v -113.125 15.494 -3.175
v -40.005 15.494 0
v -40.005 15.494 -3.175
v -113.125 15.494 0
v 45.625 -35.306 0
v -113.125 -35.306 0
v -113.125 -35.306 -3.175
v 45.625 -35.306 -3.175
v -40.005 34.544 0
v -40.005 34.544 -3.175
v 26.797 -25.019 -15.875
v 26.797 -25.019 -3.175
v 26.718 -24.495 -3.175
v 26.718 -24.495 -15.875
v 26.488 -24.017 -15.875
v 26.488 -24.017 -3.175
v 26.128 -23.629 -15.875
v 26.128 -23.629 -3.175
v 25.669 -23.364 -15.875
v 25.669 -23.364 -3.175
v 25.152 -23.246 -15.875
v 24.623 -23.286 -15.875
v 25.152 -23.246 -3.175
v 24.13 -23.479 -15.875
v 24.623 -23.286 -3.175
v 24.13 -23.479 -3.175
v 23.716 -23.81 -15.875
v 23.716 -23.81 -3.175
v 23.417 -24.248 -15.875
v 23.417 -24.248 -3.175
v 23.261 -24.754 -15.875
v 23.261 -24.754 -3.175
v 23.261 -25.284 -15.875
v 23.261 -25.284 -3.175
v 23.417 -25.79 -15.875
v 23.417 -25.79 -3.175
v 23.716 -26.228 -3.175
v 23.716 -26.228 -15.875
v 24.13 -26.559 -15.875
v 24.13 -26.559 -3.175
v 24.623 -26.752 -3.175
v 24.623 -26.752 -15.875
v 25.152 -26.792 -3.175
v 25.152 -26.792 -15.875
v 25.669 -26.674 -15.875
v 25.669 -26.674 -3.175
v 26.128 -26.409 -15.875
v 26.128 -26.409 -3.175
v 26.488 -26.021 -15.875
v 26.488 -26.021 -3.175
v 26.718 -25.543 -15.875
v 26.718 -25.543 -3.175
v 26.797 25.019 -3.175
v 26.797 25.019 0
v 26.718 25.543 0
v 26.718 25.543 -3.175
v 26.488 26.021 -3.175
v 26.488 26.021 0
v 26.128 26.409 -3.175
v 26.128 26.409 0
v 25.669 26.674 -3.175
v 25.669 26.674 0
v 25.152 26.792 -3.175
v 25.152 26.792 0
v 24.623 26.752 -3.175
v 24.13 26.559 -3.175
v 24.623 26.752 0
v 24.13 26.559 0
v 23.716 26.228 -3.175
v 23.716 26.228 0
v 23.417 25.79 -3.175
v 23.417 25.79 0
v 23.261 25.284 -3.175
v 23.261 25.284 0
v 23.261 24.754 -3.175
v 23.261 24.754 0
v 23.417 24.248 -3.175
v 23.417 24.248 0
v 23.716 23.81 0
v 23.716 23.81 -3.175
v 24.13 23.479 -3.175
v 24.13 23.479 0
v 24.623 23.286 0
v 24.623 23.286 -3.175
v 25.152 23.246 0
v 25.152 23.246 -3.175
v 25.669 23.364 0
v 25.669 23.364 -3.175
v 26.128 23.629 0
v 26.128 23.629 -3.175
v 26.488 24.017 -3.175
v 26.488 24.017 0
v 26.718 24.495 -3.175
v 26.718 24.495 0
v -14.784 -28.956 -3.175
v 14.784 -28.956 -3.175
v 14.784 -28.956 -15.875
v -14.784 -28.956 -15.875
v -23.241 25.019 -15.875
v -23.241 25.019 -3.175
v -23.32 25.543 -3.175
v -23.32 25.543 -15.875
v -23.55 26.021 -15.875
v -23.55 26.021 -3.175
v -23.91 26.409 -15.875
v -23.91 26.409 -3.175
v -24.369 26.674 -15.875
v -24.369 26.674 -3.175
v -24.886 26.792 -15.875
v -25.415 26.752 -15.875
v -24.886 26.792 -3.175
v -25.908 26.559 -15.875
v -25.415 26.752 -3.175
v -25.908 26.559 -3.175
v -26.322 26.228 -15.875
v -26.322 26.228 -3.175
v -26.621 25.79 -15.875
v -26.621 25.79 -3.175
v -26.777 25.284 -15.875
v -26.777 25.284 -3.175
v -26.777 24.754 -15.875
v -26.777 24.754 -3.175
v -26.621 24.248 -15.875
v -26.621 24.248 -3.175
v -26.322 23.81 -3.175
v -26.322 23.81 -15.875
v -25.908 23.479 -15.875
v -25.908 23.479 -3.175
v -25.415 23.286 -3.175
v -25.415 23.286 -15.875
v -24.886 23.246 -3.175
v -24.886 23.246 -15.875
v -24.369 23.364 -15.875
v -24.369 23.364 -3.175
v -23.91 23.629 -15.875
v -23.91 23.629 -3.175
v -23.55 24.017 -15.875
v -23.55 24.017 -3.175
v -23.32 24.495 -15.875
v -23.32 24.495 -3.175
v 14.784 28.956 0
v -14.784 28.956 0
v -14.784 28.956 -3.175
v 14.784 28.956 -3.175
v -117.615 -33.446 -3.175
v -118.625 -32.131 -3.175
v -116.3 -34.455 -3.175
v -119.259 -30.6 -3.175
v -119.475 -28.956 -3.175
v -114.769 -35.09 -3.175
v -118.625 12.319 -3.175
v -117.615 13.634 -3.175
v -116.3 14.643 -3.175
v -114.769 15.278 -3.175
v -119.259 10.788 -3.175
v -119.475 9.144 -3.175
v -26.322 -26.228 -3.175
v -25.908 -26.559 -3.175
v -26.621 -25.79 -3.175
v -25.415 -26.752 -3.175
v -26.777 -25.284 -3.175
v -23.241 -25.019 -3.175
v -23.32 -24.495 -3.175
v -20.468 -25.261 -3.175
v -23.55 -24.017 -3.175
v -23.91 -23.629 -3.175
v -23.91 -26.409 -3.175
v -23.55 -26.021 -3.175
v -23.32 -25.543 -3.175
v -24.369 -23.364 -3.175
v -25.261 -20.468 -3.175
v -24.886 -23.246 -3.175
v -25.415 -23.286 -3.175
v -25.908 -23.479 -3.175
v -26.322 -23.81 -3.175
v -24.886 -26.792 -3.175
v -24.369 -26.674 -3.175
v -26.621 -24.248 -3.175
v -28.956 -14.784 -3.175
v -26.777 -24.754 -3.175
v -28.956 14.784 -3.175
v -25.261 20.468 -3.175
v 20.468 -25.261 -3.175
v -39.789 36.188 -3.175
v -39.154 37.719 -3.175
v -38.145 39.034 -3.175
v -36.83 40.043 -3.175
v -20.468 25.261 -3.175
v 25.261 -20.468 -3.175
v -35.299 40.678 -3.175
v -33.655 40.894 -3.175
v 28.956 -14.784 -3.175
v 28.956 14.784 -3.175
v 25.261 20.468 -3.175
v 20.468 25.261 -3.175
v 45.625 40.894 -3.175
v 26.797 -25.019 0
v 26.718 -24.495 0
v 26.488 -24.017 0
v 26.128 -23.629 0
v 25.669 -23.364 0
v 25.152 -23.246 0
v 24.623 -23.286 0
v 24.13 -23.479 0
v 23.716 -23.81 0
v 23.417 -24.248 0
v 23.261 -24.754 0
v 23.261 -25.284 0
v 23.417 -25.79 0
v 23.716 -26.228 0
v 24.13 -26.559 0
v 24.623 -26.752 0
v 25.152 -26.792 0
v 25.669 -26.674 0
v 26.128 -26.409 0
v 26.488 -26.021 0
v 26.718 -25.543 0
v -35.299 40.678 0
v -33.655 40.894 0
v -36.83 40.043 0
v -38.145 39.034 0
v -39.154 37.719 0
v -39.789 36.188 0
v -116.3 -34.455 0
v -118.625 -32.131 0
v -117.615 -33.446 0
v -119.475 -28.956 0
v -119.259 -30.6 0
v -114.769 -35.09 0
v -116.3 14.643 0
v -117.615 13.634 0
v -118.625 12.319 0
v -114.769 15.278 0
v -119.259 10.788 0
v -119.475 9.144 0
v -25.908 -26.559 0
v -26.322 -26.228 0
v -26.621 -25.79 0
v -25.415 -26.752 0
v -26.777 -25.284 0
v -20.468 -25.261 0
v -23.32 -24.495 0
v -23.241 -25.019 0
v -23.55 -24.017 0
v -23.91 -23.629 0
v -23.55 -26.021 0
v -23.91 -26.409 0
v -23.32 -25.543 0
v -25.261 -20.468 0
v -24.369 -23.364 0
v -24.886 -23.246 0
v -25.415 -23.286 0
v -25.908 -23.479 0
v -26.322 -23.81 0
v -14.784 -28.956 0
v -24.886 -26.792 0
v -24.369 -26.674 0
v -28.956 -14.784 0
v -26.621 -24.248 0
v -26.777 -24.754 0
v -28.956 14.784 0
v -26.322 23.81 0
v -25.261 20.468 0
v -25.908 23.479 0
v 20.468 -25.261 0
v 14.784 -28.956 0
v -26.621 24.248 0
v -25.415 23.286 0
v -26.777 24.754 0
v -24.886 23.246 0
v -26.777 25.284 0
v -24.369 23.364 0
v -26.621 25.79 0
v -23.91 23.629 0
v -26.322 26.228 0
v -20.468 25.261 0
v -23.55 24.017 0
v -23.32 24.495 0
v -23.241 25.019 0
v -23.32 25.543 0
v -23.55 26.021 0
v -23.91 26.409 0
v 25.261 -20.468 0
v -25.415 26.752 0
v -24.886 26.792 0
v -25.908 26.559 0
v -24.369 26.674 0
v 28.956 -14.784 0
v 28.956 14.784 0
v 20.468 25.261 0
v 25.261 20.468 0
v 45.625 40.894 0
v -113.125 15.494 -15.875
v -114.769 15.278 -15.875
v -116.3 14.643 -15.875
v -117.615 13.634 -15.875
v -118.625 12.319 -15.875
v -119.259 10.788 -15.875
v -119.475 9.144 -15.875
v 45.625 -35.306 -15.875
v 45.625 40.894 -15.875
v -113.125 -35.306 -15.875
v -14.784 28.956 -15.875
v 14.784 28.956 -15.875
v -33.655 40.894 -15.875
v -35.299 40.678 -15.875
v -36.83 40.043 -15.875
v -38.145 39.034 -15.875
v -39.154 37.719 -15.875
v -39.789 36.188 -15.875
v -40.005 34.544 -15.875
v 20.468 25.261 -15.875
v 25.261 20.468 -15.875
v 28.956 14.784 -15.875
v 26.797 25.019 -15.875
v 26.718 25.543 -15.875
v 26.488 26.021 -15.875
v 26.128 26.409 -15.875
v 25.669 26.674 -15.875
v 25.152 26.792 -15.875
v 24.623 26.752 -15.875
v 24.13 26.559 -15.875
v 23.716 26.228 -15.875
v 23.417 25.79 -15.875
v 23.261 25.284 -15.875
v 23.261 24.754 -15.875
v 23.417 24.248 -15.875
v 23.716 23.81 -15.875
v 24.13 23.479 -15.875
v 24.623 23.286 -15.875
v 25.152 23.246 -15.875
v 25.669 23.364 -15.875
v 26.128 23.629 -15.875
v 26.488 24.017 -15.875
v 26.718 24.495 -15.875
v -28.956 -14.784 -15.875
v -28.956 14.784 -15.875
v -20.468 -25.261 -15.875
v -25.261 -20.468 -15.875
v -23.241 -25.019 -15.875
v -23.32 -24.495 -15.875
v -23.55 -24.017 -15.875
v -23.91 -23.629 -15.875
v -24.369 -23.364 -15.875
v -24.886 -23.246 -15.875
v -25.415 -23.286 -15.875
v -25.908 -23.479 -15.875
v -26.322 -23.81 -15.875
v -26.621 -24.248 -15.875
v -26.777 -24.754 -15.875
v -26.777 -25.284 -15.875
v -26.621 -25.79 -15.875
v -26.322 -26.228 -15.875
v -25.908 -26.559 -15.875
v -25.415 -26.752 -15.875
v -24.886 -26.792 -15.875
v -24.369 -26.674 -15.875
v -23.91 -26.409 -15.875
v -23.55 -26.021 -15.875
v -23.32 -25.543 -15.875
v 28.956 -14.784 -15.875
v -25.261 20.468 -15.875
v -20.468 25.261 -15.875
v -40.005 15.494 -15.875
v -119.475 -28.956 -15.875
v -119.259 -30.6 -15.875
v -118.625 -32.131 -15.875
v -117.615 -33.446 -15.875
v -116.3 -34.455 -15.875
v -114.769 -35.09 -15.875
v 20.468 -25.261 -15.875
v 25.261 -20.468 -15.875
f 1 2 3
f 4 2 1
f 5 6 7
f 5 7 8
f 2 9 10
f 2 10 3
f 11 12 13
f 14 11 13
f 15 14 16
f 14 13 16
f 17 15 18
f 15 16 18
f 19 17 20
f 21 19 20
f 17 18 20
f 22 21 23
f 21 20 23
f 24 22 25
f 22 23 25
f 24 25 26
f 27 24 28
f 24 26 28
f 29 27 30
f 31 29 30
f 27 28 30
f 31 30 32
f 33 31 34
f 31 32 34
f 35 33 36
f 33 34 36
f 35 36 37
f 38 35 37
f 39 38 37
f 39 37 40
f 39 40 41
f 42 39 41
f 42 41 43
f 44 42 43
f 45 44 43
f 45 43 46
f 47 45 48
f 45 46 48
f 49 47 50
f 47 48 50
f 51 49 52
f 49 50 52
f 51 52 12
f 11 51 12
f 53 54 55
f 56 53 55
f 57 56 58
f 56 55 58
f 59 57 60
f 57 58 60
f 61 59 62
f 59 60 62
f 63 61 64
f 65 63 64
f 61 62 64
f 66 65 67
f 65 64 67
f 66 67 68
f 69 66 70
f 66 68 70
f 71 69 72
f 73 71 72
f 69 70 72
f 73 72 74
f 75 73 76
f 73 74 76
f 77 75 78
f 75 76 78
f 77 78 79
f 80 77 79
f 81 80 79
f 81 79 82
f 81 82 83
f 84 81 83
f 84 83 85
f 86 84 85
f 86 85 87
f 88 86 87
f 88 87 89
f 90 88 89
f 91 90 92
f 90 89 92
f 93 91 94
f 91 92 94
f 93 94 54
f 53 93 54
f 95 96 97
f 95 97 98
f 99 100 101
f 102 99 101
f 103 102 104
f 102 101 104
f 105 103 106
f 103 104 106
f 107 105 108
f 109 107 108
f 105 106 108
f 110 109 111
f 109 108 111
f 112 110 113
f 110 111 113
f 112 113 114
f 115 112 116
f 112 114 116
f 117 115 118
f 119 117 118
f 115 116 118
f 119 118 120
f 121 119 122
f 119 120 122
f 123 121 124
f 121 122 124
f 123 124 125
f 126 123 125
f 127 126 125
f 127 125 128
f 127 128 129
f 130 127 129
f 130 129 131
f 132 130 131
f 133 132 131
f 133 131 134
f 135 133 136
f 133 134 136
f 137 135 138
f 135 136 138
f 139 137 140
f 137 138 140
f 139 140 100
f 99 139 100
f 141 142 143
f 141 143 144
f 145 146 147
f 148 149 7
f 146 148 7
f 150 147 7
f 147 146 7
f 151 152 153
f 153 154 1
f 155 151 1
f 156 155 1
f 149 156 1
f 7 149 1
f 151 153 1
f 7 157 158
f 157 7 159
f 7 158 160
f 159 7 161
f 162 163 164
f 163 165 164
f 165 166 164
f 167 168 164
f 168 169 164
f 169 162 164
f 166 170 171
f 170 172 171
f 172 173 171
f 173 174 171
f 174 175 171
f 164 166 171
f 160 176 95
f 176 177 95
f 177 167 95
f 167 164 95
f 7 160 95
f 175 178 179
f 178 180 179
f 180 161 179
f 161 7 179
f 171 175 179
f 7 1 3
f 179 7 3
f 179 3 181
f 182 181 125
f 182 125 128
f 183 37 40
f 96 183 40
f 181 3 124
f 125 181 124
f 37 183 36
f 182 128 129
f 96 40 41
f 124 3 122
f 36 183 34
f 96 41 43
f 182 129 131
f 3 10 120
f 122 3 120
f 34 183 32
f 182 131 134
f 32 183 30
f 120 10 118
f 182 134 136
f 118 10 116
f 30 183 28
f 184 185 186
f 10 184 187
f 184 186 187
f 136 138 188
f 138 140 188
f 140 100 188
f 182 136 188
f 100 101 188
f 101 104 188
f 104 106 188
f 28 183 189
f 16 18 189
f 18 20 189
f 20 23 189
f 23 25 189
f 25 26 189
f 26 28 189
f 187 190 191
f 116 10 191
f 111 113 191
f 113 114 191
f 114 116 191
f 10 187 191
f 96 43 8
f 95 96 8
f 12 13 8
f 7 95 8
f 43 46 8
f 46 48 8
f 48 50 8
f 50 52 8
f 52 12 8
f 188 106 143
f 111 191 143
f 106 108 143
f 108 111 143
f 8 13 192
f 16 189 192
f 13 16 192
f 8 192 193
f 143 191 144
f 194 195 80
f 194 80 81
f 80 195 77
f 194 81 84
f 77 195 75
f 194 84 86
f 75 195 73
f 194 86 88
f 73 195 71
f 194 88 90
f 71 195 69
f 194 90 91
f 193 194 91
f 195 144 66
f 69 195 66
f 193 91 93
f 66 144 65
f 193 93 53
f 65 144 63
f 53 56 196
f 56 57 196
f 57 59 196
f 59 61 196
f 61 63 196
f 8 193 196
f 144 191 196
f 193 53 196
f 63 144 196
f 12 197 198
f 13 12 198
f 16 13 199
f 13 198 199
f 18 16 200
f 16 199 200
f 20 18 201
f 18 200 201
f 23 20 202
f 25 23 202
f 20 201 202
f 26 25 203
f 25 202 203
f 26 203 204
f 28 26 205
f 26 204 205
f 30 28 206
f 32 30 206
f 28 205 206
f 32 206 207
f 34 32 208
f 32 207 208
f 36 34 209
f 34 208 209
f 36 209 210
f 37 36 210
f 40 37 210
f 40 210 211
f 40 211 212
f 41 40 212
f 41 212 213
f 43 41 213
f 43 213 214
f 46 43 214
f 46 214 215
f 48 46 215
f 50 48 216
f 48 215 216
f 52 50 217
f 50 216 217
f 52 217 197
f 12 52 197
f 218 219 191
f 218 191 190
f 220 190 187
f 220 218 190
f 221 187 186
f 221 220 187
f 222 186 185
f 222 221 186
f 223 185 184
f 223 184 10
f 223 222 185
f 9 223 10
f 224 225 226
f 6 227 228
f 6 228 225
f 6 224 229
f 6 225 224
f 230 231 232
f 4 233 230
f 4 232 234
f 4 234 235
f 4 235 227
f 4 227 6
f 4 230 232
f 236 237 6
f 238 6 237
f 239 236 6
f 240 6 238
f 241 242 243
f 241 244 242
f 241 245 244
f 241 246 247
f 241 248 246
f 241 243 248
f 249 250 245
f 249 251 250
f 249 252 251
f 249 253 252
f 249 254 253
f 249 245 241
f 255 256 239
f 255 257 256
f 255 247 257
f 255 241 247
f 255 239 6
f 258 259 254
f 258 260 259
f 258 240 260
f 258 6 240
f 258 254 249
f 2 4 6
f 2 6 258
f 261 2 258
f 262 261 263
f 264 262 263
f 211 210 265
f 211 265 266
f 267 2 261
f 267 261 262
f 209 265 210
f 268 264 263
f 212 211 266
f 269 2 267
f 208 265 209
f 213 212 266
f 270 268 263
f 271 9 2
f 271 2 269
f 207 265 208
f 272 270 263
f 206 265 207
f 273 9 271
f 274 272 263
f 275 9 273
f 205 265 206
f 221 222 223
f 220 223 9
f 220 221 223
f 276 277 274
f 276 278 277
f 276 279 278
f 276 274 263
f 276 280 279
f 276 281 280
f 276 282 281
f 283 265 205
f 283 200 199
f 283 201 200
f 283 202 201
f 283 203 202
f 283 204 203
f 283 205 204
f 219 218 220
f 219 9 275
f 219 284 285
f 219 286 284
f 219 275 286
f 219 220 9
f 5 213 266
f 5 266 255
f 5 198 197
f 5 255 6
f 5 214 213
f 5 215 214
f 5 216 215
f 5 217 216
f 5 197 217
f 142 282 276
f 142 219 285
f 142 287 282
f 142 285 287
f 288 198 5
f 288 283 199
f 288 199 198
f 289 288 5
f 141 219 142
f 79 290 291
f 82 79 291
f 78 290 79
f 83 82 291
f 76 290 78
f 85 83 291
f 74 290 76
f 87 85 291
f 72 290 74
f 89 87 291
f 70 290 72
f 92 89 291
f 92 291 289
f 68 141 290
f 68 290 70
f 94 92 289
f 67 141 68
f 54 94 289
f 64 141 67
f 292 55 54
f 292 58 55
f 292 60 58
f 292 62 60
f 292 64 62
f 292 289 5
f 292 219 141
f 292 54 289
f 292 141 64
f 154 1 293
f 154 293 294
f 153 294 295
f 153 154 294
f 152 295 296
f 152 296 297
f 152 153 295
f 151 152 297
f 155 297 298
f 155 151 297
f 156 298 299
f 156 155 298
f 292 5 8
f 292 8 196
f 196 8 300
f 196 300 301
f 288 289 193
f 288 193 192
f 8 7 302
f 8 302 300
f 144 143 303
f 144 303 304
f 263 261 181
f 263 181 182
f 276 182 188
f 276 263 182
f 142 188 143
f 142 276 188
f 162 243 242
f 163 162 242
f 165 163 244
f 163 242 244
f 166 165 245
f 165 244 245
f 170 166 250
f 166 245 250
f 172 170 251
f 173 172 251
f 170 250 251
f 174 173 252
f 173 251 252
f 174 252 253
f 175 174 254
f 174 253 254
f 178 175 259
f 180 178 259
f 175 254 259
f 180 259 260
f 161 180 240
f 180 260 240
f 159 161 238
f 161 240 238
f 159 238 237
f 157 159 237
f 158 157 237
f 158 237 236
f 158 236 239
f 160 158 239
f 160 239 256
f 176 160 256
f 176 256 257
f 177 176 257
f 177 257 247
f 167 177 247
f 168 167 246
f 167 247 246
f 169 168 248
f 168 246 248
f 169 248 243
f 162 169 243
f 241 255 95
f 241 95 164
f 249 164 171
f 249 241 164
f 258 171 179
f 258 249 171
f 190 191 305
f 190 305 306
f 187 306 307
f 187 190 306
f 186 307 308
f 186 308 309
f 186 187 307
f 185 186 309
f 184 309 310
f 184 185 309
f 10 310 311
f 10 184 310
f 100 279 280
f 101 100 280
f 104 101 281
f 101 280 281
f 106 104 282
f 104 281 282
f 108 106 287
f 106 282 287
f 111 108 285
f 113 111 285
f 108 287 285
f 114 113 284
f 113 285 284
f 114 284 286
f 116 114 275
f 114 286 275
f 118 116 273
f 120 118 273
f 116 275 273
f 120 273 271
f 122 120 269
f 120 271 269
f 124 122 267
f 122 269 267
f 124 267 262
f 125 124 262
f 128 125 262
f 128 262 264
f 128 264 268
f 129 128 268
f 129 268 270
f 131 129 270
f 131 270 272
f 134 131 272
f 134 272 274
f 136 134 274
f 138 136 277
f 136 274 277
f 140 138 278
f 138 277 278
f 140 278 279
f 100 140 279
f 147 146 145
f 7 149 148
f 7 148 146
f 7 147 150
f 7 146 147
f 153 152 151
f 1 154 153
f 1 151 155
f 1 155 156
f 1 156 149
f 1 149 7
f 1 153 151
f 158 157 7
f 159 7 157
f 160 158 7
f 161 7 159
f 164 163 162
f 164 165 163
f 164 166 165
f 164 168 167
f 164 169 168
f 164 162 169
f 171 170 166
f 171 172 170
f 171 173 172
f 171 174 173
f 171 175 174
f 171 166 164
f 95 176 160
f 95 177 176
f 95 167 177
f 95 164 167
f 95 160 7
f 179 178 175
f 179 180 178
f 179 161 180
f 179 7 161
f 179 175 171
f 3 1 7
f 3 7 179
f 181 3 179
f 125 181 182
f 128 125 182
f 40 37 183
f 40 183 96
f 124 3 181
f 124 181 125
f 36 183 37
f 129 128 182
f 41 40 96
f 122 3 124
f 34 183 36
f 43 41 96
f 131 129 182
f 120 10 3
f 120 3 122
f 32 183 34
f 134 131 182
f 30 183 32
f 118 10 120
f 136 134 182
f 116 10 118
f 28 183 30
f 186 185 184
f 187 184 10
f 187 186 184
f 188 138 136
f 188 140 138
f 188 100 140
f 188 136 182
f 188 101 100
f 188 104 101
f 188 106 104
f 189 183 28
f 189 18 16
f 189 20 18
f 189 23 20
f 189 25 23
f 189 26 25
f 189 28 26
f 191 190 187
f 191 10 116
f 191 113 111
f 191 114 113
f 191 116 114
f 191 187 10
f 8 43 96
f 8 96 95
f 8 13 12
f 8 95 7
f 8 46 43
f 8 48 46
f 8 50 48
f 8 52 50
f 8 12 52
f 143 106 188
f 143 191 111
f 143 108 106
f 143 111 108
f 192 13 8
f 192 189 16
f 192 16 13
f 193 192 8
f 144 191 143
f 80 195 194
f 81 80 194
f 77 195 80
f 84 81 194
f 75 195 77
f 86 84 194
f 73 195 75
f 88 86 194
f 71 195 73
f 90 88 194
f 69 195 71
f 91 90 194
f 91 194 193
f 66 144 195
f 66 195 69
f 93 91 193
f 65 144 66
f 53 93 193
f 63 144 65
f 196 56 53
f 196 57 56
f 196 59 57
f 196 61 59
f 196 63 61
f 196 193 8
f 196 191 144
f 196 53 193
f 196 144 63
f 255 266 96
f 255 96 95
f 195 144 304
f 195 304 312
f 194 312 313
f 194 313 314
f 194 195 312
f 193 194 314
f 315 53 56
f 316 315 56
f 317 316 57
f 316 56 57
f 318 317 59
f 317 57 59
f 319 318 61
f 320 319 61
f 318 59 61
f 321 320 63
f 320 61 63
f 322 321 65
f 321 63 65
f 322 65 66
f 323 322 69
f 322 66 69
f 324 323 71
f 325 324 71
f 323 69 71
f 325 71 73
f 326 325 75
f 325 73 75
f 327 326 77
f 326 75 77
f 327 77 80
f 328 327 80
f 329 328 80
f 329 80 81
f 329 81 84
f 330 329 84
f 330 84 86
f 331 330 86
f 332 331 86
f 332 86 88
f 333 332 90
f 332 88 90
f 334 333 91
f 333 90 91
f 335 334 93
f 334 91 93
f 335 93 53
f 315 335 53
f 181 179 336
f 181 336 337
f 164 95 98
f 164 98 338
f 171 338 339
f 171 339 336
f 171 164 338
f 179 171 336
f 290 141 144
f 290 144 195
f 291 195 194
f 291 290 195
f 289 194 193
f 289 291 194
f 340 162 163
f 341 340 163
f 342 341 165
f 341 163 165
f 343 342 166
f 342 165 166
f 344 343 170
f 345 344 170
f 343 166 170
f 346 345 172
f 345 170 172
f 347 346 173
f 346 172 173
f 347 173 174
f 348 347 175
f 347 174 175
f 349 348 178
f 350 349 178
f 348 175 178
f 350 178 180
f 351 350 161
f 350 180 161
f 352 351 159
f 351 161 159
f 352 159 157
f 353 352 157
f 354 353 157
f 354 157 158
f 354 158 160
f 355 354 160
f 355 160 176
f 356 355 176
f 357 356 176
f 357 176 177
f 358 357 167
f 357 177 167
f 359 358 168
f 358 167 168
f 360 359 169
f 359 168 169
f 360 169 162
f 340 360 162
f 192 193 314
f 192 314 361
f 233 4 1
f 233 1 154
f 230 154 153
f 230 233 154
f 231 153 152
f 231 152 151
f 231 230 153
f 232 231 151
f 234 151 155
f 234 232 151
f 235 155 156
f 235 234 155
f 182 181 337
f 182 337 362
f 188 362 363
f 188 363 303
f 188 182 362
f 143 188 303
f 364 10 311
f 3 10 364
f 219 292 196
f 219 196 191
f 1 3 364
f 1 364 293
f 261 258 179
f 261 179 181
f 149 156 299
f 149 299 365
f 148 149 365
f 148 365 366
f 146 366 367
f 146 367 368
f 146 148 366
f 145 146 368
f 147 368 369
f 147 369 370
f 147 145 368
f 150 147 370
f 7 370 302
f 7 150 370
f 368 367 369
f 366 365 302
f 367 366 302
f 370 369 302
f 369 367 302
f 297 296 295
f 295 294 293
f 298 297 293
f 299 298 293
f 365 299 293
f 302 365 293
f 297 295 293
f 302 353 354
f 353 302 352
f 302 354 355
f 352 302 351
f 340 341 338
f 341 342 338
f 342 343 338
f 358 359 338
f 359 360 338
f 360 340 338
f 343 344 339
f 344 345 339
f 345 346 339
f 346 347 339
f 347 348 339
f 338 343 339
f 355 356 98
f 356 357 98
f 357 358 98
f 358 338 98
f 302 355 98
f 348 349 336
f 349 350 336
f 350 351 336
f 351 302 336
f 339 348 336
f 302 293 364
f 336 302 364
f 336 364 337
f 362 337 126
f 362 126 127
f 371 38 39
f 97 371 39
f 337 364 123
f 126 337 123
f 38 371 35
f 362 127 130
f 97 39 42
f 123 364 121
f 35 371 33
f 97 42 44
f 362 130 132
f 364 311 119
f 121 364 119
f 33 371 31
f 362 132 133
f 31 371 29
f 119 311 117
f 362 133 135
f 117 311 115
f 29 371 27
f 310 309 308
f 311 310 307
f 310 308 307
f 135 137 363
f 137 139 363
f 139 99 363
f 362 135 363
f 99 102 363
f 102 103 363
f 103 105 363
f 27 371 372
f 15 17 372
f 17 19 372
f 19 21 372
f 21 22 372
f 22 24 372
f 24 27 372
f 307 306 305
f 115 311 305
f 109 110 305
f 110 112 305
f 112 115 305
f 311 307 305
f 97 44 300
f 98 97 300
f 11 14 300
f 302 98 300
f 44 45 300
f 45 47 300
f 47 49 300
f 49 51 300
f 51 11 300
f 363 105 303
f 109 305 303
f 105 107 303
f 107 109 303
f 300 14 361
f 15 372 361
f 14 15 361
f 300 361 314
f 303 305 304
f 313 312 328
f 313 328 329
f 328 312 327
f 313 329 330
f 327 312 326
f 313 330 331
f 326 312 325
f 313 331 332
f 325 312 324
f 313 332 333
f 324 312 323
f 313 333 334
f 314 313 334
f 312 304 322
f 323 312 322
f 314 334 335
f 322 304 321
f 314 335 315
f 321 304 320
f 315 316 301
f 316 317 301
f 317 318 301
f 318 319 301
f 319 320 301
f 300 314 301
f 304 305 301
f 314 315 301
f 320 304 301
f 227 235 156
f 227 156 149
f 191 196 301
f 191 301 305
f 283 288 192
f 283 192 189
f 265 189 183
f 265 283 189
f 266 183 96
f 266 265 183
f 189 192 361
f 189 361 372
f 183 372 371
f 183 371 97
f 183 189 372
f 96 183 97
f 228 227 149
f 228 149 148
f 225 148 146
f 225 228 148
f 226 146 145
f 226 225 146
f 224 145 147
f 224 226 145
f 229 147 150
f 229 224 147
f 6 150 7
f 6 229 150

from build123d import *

# Parameters (mm, degrees)
F0_R     = 1.778
F1_DEPTH = 3.175
F2_DEPTH = 12.7


# Not quite as in the source:
# - a length typed as a fraction of an inch, garbled in the dataset ("3 / 203.2 mm" for 3/8 in), is restored
# - a feature names something its author has since deleted; it is built from what else it names


with BuildPart() as f1:
    # F0 (on Top) → F1 (new body)
    with BuildSketch(Plane.XY):
        with BuildLine():
            Line((-113.12525, -35.306), (32.92475, -35.306))
            Line((32.92475, -35.306), (45.6247710268, -35.306))
            Line((45.6247710268, -35.306), (45.6247710268, 40.894))
            Line((45.6247710268, 40.894), (32.92475, 40.894))
            Line((32.92475, 40.894), (-33.6550021708, 40.894))
            ThreePointArc((-33.6550021708, 40.894), (-38.1451302313, 39.0341280605), (-40.0050021708, 34.544))
            Line((-40.0050021708, 34.544), (-40.0050021708, 15.494))
            Line((-40.0050021708, 15.494), (-113.12525, 15.494))
            ThreePointArc((-113.12525, 15.494), (-117.6153780605, 13.6341280605), (-119.47525, 9.144))
            Line((-119.47525, 9.144), (-119.47525, -28.956))
            ThreePointArc((-119.47525, -28.956), (-117.6153780605, -33.4461280605), (-113.12525, -35.306))
        make_face()
        with Locations((-25.019, -25.019)):
            Circle(F0_R, mode=Mode.SUBTRACT)
        with Locations((25.019, -25.019)):
            Circle(F0_R, mode=Mode.SUBTRACT)
        with BuildLine():
            ThreePointArc((-28.956, 14.7844583262), (-22.9894556699, 22.9894556699), (-14.7844583262, 28.956))
            Line((-14.7844583262, 28.956), (14.7844583262, 28.956))
            ThreePointArc((14.7844583262, 28.956), (22.9894556699, 22.9894556699), (28.956, 14.7844583262))
            Line((28.956, 14.7844583262), (28.956, -14.7844583262))
            ThreePointArc((28.956, -14.7844583262), (22.9894556699, -22.9894556699), (14.7844583262, -28.956))
            Line((14.7844583262, -28.956), (-14.7844583262, -28.956))
            ThreePointArc((-14.7844583262, -28.956), (-22.9894556699, -22.9894556699), (-28.956, -14.7844583262))
            Line((-28.956, -14.7844583262), (-28.956, 14.7844583262))
        make_face(mode=Mode.SUBTRACT)
        with Locations((-25.019, 25.019)):
            Circle(F0_R, mode=Mode.SUBTRACT)
        with Locations((25.019, 25.019)):
            Circle(F0_R, mode=Mode.SUBTRACT)
    extrude(amount=-F1_DEPTH)


with BuildPart() as f2:
    # F2 (new): a face of the model
    f2_faces = [f1.part.faces().sort_by_distance(p)[0] for p in [
        (-40.3802916148, -2.9400750607, -3.175),
    ]]
    extrude(f2_faces, amount=F2_DEPTH)


solid = Compound([f1.part, f2.part])
